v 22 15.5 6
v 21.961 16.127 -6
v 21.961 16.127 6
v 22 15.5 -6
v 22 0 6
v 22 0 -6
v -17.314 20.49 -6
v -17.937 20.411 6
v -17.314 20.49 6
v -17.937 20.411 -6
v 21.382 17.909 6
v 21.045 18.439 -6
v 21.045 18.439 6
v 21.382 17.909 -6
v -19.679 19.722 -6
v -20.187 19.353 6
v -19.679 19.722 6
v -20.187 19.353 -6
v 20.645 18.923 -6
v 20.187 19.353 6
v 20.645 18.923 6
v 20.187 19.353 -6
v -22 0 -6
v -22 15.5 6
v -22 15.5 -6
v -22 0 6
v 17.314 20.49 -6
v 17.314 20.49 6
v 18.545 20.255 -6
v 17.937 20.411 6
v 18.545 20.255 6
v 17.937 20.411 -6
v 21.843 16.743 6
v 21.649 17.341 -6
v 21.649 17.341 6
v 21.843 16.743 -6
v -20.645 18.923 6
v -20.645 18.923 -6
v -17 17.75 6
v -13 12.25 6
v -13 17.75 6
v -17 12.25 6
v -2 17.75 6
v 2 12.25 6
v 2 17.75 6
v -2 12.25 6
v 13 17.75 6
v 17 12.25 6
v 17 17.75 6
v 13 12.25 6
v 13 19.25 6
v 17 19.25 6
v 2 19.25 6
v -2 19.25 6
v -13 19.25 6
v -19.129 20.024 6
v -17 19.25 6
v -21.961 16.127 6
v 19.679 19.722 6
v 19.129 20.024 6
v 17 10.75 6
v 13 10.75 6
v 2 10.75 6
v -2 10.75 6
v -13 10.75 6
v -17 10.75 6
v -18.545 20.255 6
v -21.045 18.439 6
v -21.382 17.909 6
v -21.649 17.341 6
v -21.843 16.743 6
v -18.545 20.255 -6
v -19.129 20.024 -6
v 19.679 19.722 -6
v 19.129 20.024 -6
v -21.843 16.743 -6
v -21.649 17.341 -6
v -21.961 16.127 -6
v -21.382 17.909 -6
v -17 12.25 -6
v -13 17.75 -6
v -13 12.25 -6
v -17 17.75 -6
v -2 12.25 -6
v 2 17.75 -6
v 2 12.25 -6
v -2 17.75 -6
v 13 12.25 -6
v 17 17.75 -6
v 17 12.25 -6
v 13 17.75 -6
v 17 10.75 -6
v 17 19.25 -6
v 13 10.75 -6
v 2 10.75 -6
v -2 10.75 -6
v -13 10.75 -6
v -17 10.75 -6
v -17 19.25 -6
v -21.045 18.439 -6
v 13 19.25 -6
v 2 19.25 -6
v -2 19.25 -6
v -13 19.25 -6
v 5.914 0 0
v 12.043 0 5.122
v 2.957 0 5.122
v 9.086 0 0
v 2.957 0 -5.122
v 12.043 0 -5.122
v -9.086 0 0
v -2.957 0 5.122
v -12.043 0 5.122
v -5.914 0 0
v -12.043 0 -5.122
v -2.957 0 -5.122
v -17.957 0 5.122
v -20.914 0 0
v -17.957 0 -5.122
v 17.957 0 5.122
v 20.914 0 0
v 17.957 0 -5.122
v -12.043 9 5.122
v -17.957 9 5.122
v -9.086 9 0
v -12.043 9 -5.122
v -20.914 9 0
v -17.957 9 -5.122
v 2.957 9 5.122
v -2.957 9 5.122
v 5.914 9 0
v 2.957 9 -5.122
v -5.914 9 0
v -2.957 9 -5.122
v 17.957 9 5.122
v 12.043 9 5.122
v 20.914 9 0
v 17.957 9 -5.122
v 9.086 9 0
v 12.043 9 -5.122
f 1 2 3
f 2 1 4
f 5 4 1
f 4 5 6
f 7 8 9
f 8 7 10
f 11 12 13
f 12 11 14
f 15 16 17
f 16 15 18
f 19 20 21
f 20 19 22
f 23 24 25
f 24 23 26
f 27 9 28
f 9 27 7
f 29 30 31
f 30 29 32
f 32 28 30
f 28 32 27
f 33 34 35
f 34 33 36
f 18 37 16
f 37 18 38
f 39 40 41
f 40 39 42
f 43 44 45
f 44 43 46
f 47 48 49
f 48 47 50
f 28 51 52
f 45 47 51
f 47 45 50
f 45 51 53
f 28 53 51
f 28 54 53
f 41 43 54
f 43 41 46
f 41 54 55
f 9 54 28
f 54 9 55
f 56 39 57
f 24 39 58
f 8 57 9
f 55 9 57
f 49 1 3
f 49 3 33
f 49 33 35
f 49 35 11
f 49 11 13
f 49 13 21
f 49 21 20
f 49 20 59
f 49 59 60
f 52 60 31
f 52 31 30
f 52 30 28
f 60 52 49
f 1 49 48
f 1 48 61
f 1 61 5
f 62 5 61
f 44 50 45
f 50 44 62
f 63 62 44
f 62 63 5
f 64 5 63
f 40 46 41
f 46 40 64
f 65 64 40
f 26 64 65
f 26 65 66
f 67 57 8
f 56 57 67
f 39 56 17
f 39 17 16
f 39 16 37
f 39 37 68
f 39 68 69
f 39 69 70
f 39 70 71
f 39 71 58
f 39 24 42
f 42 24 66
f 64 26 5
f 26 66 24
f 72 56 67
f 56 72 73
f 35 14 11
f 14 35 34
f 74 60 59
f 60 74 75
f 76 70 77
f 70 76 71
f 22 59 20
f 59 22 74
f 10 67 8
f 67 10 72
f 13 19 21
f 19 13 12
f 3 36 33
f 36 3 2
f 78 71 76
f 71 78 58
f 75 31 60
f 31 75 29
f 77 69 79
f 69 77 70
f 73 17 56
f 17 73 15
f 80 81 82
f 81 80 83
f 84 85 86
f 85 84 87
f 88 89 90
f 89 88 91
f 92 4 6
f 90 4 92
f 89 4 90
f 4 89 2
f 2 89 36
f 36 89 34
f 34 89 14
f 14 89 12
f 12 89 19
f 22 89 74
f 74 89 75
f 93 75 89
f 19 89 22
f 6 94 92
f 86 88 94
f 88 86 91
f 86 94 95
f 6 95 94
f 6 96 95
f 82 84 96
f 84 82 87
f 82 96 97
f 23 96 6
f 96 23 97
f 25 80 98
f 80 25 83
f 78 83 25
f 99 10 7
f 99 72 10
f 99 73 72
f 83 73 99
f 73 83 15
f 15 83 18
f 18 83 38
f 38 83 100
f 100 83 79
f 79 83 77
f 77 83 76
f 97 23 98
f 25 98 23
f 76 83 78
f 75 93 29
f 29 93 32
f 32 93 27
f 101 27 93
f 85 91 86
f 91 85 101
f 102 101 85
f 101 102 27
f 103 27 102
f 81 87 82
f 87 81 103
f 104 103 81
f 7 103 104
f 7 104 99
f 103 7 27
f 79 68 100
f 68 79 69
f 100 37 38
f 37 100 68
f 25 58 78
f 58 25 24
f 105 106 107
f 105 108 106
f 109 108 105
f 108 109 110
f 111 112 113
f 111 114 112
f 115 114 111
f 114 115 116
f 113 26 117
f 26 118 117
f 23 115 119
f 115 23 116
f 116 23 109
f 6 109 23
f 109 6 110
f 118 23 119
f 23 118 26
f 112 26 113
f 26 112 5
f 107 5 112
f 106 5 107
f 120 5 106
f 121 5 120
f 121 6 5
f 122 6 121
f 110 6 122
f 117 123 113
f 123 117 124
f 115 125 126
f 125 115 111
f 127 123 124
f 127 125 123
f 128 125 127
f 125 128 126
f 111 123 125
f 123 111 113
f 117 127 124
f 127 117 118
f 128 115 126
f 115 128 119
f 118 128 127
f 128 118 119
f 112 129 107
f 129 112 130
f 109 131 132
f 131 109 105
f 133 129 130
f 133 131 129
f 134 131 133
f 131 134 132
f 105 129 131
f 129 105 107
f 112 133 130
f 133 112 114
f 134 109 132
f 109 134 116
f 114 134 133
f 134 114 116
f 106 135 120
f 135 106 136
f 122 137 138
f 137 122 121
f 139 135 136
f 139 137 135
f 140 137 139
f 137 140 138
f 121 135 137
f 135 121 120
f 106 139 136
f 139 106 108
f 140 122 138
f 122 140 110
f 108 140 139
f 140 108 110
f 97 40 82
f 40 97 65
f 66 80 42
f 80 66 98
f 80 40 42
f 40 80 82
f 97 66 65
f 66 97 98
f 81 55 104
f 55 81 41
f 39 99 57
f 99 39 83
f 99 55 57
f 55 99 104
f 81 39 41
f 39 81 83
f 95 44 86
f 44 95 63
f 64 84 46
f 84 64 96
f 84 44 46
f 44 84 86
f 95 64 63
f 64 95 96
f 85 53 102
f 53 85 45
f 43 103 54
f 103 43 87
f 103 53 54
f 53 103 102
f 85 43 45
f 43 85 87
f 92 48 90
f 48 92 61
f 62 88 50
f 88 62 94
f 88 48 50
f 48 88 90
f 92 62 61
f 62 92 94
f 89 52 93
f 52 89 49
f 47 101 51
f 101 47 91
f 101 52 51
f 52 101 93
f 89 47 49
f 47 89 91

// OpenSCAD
$fn = 50;


difference() {
	union() {
		translate(v = [0, 13.5000000000, -6.0000000000]) {
			hull() {
				translate(v = [-17.0000000000, 2.0000000000, 0]) {
					cylinder(h = 12, r = 5);
				}
				translate(v = [17.0000000000, 2.0000000000, 0]) {
					cylinder(h = 12, r = 5);
				}
				translate(v = [-17.0000000000, -2.0000000000, 0]) {
					cylinder(h = 12, r = 5);
				}
				translate(v = [17.0000000000, -2.0000000000, 0]) {
					cylinder(h = 12, r = 5);
				}
			}
		}
		translate(v = [0, 13.5000000000, -6.0000000000]) {
			hull() {
				translate(v = [-17.0000000000, 2.0000000000, 0]) {
					cylinder(h = 12, r = 5);
				}
				translate(v = [17.0000000000, 2.0000000000, 0]) {
					cylinder(h = 12, r = 5);
				}
				translate(v = [-17.0000000000, -2.0000000000, 0]) {
					cylinder(h = 12, r = 5);
				}
				translate(v = [17.0000000000, -2.0000000000, 0]) {
					cylinder(h = 12, r = 5);
				}
			}
		}
		translate(v = [-22.0000000000, 0, -6.0000000000]) {
			cube(size = [44, 13.5000000000, 12]);
		}
	}
	union() {
		translate(v = [-15.0000000000, 9, 0]) {
			rotate(a = [0, 0, 0]) {
				difference() {
					union() {
						rotate(a = [90, 0, 0]) {
							linear_extrude(height = 13.5000000000) {
								polygon(points = [[5.9142500000, 0.0000000000], [2.9571250000, 5.1218907443], [-2.9571250000, 5.1218907443], [-5.9142500000, 0.0000000000], [-2.9571250000, -5.1218907443], [2.9571250000, -5.1218907443]]);
							}
						}
					}
					union();
				}
			}
		}
		translate(v = [0.0000000000, 9, 0]) {
			rotate(a = [0, 0, 0]) {
				difference() {
					union() {
						rotate(a = [90, 0, 0]) {
							linear_extrude(height = 13.5000000000) {
								polygon(points = [[5.9142500000, 0.0000000000], [2.9571250000, 5.1218907443], [-2.9571250000, 5.1218907443], [-5.9142500000, 0.0000000000], [-2.9571250000, -5.1218907443], [2.9571250000, -5.1218907443]]);
							}
						}
					}
					union();
				}
			}
		}
		translate(v = [15.0000000000, 9, 0]) {
			rotate(a = [0, 0, 0]) {
				difference() {
					union() {
						rotate(a = [90, 0, 0]) {
							linear_extrude(height = 13.5000000000) {
								polygon(points = [[5.9142500000, 0.0000000000], [2.9571250000, 5.1218907443], [-2.9571250000, 5.1218907443], [-5.9142500000, 0.0000000000], [-2.9571250000, -5.1218907443], [2.9571250000, -5.1218907443]]);
							}
						}
					}
					union();
				}
			}
		}
		translate(v = [-17.0000000000, 10.7500000000, -50]) {
			cube(size = [4, 1.5000000000, 100]);
		}
		translate(v = [-17.0000000000, 17.7500000000, -50]) {
			cube(size = [4, 1.5000000000, 100]);
		}
		translate(v = [-15.0000000000, 8, 0]) {
			rotate(a = [90, 0, 0]) {
				cylinder(h = 8, r = 3.2500000000);
			}
		}
		translate(v = [-2.0000000000, 10.7500000000, -50]) {
			cube(size = [4, 1.5000000000, 100]);
		}
		translate(v = [-2.0000000000, 17.7500000000, -50]) {
			cube(size = [4, 1.5000000000, 100]);
		}
		translate(v = [0.0000000000, 8, 0]) {
			rotate(a = [90, 0, 0]) {
				cylinder(h = 8, r = 3.2500000000);
			}
		}
		translate(v = [13.0000000000, 10.7500000000, -50]) {
			cube(size = [4, 1.5000000000, 100]);
		}
		translate(v = [13.0000000000, 17.7500000000, -50]) {
			cube(size = [4, 1.5000000000, 100]);
		}
		translate(v = [15.0000000000, 8, 0]) {
			rotate(a = [90, 0, 0]) {
				cylinder(h = 8, r = 3.2500000000);
			}
		}
	}
}
